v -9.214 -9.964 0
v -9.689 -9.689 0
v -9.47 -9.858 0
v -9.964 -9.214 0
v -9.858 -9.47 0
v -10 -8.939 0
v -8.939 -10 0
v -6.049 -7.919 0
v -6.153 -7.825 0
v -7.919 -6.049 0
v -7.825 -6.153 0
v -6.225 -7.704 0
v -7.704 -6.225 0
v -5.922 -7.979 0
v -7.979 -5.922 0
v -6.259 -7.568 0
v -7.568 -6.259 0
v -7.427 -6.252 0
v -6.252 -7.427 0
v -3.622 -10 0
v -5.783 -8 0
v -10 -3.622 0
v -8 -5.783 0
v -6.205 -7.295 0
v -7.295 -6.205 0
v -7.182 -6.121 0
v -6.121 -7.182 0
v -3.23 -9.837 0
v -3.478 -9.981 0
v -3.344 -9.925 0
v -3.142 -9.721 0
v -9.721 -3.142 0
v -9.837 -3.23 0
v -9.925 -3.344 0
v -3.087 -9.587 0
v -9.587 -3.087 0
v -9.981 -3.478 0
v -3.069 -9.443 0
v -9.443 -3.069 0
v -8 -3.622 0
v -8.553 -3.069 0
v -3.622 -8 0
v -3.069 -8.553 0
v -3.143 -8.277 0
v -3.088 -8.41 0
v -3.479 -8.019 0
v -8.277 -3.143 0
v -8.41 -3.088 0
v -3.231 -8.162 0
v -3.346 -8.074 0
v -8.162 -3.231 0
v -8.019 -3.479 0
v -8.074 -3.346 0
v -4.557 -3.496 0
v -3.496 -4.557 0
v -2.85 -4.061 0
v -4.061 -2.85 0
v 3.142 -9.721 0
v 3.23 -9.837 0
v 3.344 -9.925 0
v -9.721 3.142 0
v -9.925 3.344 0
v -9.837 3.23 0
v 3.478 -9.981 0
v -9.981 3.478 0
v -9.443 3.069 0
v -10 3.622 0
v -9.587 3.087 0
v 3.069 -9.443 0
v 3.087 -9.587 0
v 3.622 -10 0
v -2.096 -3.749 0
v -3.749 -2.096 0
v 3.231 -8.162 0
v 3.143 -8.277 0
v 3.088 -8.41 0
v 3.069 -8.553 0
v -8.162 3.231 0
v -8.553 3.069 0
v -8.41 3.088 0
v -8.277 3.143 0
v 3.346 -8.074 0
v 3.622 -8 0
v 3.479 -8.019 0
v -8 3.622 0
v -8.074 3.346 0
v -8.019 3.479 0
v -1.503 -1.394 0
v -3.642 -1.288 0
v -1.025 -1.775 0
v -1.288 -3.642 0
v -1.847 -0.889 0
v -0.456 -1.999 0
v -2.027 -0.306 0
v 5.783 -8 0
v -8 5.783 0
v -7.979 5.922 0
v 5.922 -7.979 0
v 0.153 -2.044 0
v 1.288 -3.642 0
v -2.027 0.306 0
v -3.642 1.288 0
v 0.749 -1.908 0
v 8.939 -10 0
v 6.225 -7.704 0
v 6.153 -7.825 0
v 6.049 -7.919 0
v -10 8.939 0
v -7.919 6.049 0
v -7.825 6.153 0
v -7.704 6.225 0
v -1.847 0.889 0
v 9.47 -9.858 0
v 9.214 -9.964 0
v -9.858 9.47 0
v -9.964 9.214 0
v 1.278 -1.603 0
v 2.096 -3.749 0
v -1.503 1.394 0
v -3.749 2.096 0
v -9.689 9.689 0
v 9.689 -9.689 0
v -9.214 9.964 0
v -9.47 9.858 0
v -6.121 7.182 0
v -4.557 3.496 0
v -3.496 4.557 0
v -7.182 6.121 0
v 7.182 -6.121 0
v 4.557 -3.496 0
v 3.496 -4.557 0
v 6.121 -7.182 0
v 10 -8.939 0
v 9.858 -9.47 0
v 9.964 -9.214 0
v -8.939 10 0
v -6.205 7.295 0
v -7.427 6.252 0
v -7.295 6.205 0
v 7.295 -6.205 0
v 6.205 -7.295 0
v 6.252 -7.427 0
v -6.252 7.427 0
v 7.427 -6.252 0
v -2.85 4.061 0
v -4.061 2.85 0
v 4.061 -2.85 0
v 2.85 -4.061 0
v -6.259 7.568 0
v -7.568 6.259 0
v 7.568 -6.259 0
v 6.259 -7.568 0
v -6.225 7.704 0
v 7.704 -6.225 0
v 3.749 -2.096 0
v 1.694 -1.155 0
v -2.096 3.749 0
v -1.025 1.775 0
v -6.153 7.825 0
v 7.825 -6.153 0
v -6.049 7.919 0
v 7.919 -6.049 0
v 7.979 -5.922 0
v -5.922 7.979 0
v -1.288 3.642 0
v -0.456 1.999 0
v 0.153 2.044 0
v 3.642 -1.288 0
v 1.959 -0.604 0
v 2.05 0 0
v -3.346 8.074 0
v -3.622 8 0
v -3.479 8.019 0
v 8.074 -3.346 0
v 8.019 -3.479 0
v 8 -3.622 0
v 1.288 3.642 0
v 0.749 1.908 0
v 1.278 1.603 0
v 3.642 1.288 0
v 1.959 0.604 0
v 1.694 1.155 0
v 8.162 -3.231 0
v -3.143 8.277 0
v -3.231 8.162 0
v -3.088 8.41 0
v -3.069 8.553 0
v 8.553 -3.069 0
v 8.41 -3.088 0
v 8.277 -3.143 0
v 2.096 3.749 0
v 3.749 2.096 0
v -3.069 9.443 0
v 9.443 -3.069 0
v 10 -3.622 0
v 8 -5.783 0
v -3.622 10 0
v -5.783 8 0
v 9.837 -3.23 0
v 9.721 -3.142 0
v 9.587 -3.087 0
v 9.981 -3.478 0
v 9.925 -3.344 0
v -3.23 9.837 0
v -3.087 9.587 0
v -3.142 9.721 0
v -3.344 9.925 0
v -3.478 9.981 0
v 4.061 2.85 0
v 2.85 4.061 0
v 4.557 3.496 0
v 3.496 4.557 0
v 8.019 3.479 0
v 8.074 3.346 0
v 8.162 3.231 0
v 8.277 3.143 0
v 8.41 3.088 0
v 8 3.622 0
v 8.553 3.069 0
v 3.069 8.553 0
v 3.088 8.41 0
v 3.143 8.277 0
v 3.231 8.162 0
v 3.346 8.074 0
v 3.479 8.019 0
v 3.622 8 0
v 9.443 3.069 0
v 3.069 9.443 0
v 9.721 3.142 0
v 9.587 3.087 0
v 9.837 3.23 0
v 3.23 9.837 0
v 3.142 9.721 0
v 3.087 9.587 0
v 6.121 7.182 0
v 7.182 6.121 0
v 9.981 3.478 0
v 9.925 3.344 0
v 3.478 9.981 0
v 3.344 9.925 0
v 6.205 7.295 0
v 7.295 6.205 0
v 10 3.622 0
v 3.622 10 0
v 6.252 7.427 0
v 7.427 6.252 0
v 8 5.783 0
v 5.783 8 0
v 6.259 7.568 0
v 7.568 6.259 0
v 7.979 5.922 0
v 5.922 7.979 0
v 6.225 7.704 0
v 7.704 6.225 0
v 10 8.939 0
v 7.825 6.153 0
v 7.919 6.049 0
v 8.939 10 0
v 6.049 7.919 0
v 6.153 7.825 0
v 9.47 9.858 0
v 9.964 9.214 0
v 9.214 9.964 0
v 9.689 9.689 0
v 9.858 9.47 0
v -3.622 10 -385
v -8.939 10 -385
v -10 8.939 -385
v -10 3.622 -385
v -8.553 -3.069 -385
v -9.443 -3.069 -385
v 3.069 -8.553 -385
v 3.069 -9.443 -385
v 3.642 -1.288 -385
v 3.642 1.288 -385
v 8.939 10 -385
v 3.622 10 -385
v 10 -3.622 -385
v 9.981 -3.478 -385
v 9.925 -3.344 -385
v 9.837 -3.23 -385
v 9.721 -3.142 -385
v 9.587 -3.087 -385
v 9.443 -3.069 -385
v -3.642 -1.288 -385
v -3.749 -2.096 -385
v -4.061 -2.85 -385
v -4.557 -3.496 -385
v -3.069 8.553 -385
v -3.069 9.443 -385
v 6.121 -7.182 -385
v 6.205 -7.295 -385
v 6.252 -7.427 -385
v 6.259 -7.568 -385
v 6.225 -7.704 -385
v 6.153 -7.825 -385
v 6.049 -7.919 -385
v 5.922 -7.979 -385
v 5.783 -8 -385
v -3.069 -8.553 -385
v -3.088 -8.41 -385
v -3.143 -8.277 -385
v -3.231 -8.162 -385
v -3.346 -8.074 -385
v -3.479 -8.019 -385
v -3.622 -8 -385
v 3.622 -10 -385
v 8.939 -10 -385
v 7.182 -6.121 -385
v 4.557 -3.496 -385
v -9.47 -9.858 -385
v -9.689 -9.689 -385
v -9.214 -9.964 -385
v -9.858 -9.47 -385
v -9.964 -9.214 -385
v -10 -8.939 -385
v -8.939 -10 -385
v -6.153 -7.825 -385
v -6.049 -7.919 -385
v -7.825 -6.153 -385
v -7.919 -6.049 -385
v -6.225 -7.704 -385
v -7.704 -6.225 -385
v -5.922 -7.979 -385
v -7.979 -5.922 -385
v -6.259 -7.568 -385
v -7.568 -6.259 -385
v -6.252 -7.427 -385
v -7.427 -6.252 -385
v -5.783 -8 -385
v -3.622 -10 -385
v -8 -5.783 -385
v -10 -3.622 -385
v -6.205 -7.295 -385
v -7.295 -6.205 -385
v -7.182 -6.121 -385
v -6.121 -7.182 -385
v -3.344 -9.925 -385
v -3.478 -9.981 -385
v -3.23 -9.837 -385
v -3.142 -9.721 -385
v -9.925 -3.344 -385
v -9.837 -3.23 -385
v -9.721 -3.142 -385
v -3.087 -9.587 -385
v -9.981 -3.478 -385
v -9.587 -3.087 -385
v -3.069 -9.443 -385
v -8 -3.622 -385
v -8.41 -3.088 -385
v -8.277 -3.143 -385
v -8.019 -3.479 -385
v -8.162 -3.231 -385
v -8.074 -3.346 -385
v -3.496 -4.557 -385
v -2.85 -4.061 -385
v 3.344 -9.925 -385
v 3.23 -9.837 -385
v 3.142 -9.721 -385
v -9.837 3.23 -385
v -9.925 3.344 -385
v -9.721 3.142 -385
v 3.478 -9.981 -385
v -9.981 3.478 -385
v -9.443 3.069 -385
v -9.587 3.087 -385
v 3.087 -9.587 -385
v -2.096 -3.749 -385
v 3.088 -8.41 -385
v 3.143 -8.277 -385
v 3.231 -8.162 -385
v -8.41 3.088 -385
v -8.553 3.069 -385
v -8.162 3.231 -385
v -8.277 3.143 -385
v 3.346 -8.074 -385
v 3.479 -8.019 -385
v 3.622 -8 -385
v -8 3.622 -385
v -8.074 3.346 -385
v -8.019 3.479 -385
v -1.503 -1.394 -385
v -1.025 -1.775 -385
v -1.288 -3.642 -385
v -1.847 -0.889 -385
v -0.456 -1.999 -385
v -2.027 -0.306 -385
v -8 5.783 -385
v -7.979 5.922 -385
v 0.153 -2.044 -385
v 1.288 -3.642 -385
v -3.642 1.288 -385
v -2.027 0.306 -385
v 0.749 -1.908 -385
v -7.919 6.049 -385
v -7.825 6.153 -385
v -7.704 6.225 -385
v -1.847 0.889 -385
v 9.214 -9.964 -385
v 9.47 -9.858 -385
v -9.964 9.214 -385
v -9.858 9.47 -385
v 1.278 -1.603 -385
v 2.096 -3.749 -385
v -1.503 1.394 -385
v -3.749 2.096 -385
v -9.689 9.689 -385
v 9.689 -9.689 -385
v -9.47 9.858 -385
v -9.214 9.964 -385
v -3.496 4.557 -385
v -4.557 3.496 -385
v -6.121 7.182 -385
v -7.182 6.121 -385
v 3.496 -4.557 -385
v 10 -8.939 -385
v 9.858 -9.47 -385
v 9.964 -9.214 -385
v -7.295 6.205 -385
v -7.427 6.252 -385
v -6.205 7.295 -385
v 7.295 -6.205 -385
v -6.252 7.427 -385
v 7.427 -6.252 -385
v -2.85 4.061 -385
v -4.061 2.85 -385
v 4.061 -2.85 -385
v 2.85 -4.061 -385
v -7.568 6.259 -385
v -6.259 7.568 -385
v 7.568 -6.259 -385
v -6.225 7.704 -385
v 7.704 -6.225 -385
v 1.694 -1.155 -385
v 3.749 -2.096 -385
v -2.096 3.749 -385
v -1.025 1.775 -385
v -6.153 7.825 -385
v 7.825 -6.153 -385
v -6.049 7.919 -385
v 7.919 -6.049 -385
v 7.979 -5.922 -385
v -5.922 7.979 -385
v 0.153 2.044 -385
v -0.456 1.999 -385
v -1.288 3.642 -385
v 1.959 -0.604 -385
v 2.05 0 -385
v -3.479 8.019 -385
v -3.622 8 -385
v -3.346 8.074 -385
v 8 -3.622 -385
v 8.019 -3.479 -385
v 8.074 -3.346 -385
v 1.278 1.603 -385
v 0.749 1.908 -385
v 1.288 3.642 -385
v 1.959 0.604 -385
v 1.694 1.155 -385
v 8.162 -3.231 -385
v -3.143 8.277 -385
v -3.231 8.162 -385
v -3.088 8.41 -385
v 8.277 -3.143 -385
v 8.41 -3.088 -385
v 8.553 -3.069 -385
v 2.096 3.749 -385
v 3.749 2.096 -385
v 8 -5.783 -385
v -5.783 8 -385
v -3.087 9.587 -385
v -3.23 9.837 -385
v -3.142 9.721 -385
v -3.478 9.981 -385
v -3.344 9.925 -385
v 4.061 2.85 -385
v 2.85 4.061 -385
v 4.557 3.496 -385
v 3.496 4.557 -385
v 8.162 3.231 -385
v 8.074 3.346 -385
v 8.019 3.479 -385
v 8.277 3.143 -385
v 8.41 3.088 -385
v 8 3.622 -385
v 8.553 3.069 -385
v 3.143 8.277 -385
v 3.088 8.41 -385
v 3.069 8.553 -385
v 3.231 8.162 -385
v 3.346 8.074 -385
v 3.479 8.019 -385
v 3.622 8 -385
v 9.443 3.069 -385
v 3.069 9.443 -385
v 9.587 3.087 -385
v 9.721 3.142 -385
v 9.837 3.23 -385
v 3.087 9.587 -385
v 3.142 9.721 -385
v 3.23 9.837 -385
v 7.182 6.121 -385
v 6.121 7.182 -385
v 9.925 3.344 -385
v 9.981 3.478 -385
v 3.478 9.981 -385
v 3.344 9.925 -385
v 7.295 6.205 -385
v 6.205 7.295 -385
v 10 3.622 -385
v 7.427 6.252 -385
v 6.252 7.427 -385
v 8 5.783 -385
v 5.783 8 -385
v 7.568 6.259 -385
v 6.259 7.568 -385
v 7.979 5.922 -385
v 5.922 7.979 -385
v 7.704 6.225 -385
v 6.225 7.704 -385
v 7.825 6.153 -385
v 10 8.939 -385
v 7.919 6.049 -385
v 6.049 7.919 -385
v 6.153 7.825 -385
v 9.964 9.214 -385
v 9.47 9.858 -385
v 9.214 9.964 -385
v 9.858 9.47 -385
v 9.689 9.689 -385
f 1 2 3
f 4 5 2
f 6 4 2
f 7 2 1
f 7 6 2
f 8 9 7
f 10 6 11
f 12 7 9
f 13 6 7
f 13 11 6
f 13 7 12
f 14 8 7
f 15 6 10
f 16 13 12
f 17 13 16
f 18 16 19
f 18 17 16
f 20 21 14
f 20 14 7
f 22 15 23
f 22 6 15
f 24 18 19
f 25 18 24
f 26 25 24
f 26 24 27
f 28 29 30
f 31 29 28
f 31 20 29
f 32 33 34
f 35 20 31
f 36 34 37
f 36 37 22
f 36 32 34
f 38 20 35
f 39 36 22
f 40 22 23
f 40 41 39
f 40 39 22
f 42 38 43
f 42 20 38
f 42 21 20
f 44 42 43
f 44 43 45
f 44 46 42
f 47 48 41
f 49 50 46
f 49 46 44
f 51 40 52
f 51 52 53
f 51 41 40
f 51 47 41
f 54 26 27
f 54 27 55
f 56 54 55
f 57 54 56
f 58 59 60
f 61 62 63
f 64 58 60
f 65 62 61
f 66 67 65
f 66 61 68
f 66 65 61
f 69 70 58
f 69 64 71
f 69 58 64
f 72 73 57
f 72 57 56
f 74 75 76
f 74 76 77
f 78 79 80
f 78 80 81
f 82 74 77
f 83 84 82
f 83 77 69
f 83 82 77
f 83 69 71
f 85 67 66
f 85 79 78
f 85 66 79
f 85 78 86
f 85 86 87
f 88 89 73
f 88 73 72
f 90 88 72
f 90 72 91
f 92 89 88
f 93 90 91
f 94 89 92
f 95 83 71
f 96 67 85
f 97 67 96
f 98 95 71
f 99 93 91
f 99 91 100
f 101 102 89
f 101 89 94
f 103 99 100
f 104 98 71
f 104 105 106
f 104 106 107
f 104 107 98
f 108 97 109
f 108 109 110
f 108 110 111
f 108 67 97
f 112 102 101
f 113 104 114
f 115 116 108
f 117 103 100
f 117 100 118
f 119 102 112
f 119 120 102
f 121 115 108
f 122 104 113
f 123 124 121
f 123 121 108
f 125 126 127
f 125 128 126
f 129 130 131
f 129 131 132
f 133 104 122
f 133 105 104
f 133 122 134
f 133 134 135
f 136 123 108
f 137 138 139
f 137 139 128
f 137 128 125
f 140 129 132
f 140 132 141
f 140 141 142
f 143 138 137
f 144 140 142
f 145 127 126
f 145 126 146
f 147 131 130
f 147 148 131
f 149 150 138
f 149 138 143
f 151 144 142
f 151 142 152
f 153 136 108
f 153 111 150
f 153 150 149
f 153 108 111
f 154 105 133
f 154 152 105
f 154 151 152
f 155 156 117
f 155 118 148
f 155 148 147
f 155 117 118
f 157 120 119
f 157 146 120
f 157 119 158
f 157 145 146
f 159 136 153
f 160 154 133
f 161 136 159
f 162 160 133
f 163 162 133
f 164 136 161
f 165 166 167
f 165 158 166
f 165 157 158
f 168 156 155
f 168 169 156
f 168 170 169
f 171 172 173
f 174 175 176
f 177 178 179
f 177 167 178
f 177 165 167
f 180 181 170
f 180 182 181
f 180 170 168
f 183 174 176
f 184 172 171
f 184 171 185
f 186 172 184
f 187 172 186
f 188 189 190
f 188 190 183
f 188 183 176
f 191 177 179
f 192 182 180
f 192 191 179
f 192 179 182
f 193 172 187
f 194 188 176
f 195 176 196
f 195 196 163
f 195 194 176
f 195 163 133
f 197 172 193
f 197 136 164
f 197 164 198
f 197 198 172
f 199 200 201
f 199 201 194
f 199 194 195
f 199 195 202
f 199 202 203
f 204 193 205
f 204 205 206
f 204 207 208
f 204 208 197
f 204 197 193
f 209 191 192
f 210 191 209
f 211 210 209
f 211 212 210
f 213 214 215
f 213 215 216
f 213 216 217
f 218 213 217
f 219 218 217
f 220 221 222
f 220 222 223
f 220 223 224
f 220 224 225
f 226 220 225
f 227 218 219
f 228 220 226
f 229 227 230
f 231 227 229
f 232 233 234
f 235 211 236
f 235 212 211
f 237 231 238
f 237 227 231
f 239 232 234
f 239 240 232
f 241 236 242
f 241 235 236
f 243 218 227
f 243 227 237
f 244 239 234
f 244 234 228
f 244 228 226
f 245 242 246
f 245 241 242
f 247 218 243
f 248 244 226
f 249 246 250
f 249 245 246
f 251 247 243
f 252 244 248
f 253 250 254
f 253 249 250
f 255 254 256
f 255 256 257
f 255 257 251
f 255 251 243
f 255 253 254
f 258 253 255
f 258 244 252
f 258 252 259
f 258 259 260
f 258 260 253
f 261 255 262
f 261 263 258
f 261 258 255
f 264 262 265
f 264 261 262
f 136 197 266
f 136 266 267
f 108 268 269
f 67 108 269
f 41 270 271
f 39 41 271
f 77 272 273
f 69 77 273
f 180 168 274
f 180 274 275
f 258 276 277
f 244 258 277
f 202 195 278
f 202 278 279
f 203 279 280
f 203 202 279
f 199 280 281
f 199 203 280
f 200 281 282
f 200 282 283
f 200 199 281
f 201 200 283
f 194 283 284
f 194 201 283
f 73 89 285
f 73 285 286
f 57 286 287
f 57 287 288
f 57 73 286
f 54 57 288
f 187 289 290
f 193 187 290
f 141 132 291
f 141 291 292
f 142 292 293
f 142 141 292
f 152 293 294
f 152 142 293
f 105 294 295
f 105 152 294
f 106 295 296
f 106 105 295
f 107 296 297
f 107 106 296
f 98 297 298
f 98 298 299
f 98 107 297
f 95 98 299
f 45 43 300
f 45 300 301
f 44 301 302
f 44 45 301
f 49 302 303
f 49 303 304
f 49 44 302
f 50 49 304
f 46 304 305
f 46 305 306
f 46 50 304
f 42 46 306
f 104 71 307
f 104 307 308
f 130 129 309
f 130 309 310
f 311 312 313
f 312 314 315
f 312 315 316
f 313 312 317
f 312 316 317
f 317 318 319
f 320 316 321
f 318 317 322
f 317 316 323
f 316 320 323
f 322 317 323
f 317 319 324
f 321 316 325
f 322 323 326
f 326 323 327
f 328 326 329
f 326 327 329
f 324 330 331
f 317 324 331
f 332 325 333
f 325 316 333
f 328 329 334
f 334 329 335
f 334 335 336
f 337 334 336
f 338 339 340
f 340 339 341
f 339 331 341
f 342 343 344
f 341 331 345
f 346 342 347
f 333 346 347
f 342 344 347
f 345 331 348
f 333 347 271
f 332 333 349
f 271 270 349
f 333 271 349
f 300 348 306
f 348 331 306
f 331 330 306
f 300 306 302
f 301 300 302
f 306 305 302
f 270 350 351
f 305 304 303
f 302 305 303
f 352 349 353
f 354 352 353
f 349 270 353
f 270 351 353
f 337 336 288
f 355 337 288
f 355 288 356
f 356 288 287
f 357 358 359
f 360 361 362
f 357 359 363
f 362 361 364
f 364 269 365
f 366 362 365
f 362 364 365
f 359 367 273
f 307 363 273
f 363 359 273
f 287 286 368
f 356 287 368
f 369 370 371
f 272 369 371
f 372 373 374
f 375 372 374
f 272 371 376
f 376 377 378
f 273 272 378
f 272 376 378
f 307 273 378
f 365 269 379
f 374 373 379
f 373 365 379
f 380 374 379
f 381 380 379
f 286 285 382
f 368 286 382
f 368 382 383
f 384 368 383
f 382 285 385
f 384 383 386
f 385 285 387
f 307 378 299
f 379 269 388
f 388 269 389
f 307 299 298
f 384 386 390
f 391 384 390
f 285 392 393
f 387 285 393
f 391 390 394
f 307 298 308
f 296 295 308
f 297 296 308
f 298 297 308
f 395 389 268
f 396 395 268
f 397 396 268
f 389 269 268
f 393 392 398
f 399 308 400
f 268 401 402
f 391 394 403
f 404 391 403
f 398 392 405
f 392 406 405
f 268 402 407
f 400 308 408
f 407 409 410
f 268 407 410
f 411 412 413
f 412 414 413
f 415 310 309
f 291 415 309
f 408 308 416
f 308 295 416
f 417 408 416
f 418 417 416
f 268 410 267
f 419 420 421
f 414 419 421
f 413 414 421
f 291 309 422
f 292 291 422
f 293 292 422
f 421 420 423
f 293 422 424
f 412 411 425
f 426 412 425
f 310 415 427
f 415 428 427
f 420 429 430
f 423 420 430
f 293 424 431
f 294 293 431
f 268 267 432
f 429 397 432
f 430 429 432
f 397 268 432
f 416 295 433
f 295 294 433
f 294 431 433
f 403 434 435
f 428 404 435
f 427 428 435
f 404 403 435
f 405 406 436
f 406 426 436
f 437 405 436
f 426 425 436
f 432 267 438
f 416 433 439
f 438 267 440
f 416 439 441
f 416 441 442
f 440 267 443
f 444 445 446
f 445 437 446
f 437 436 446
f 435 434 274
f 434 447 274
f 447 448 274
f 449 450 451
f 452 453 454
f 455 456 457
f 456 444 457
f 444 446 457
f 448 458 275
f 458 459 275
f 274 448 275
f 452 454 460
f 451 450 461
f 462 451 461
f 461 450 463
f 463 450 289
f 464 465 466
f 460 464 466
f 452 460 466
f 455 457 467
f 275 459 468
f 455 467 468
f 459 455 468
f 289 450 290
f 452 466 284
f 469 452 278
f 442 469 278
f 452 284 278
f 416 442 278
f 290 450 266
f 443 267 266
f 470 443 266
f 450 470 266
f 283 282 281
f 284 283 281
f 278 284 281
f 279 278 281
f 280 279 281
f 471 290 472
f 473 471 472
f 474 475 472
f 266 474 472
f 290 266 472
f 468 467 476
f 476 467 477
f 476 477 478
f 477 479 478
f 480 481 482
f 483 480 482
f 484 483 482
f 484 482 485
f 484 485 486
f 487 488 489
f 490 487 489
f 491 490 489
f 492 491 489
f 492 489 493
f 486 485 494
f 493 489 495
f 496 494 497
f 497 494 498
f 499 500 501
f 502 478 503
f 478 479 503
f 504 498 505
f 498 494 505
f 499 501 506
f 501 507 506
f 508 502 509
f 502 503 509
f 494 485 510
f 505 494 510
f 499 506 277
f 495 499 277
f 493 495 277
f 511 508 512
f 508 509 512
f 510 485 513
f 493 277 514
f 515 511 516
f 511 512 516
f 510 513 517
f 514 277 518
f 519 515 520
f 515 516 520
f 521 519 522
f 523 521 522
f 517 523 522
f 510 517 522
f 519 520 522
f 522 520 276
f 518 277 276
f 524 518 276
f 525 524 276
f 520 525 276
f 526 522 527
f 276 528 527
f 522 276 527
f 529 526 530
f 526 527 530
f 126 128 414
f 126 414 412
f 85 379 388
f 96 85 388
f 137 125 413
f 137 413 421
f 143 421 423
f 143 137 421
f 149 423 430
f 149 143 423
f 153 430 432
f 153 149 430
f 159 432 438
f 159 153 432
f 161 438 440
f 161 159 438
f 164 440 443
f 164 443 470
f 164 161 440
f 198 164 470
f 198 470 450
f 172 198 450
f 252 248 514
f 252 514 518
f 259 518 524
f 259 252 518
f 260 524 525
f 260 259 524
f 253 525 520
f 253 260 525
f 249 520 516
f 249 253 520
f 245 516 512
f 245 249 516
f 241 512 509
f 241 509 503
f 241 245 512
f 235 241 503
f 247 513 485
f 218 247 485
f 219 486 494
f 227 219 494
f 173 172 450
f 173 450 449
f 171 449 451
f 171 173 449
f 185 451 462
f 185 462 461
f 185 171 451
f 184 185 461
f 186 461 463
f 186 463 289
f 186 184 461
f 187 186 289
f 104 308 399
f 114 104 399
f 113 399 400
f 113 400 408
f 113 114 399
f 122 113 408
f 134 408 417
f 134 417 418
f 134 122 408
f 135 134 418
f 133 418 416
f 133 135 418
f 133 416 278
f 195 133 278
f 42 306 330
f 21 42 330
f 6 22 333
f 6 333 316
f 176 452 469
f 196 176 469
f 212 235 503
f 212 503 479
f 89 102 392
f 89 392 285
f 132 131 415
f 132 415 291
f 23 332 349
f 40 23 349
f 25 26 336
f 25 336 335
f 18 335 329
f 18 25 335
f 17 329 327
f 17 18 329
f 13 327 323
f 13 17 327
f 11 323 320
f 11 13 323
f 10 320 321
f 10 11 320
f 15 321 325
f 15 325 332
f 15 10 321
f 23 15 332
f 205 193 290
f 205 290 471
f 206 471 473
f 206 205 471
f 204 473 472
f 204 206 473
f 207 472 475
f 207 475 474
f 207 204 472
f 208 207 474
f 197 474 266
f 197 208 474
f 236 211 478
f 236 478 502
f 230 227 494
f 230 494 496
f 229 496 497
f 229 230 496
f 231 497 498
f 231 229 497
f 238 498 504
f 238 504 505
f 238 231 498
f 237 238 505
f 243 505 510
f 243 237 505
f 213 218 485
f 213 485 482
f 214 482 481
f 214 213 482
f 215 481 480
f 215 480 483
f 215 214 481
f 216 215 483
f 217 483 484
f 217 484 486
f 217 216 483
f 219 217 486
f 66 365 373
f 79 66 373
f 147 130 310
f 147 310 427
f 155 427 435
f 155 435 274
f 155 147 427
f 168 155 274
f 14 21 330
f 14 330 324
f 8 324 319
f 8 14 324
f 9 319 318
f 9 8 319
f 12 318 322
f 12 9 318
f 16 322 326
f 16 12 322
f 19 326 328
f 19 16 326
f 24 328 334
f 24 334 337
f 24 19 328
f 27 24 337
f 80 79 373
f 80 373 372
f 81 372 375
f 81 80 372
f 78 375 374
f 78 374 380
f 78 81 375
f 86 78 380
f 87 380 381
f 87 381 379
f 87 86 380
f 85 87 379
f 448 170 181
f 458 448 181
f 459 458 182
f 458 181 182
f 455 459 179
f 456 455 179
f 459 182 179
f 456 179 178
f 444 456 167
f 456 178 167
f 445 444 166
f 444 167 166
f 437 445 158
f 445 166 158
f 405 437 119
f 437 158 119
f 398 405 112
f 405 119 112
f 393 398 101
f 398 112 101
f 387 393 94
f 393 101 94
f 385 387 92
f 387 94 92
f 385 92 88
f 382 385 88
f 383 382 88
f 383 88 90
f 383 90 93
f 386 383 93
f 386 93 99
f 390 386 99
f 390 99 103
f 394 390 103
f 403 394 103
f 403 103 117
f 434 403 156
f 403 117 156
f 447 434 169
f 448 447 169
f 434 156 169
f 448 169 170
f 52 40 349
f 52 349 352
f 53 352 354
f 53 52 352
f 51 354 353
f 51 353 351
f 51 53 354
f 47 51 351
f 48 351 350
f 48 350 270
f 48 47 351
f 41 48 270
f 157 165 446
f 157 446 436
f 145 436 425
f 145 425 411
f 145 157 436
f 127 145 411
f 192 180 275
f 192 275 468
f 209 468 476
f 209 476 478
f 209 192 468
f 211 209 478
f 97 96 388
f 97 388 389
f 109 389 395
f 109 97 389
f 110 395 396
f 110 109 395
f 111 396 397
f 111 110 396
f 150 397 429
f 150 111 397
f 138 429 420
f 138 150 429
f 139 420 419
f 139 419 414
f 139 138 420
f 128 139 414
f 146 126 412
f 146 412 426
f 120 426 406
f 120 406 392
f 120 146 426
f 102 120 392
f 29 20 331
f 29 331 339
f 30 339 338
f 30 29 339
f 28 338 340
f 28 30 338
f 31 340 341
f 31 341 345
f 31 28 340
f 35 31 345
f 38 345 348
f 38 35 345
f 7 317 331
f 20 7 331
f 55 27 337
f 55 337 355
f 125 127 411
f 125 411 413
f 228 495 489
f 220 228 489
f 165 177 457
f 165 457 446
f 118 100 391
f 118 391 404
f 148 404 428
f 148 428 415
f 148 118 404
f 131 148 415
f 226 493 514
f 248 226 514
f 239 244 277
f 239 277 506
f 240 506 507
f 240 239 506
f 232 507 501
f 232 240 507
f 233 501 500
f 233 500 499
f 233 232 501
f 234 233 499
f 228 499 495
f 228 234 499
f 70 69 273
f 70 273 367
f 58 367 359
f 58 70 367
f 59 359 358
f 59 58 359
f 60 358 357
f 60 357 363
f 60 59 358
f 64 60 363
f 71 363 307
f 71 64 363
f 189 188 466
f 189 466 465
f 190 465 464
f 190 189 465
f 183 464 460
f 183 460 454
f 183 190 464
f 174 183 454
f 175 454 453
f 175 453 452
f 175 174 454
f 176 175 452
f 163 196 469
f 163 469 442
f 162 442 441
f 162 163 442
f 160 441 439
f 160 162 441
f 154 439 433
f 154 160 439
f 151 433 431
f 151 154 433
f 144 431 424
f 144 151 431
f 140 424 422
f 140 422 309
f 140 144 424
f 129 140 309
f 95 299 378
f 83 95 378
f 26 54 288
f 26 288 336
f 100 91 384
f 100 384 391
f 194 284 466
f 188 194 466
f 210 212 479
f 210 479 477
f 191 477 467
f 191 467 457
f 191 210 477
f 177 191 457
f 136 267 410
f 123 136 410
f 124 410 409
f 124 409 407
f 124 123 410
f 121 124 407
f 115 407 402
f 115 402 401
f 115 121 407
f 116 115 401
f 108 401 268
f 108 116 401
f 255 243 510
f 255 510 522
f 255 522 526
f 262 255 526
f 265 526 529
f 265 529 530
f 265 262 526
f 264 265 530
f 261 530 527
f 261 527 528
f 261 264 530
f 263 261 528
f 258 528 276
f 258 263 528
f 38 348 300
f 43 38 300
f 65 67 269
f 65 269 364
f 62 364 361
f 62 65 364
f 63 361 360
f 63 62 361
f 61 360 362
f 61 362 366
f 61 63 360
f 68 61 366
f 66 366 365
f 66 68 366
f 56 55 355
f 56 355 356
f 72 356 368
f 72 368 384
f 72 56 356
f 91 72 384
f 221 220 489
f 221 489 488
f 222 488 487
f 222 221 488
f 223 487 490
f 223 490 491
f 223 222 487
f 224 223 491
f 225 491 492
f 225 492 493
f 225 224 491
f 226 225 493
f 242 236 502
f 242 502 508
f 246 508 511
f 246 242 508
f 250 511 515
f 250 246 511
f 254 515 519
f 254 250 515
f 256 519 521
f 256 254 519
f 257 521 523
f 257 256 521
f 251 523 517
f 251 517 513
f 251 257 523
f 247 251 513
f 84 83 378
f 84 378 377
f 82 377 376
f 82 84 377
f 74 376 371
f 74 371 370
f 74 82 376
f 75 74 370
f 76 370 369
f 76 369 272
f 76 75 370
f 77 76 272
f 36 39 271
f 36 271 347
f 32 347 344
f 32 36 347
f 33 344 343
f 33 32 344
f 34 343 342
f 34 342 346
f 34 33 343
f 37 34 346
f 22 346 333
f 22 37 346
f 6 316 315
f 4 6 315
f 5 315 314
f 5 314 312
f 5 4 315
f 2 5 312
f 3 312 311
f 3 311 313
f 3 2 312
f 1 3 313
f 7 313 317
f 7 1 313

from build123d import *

# Parameters (mm, degrees)
SKETCH2_R           = 2.05
BOSS_EXTRUDE2_DEPTH = 385


with BuildPart() as part:
    # Sketch2 → Boss-Extrude2 (new body)
    with BuildSketch(Plane.XY):
        with BuildLine():
            Line((-3.642230561, 1.287773026), (-3.642230561, -1.287773026))
            ThreePointArc((-3.642230561, -1.287773026), (-3.87999308, -2.483085929), (-4.55708345, -3.496423279))
            Line((-4.55708345, -3.496423279), (-7.182004606, -6.121344434))
            ThreePointArc((-7.182004606, -6.121344434), (-7.704200045, -6.225215565), (-8, -5.782519648))
            Line((-8, -5.782519648), (-8, -3.622007668))
            ThreePointArc((-8, -3.622007668), (-8.161974206, -3.230967343), (-8.553014531, -3.068993137))
            Line((-8.553014531, -3.068993137), (-9.443284204, -3.068993137))
            ThreePointArc((-9.443284204, -3.068993137), (-9.836715763, -3.229656566), (-10, -3.622007668))
            Line((-10, -3.622007668), (-10, -8.939033256))
            ThreePointArc((-10, -8.939033256), (-9.689250035, -9.689250035), (-8.939033256, -10))
            Line((-8.939033256, -10), (-3.622007668, -10))
            ThreePointArc((-3.622007668, -10), (-3.229656566, -9.836715763), (-3.068993137, -9.443284204))
            Line((-3.068993137, -9.443284204), (-3.068993137, -8.553014531))
            ThreePointArc((-3.068993137, -8.553014531), (-3.230967343, -8.161974206), (-3.622007668, -8))
            Line((-3.622007668, -8), (-5.782519648, -8))
            ThreePointArc((-5.782519648, -8), (-6.225215565, -7.704200045), (-6.121344434, -7.182004606))
            Line((-6.121344434, -7.182004606), (-3.496423279, -4.55708345))
            ThreePointArc((-3.496423279, -4.55708345), (-2.483085929, -3.87999308), (-1.287773026, -3.642230561))
            Line((-1.287773026, -3.642230561), (1.287773026, -3.642230561))
            ThreePointArc((1.287773026, -3.642230561), (2.483085929, -3.87999308), (3.496423279, -4.55708345))
            Line((3.496423279, -4.55708345), (6.121344434, -7.182004606))
            ThreePointArc((6.121344434, -7.182004606), (6.225215565, -7.704200045), (5.782519648, -8))
            Line((5.782519648, -8), (3.622007668, -8))
            ThreePointArc((3.622007668, -8), (3.230967343, -8.161974206), (3.068993137, -8.553014531))
            Line((3.068993137, -8.553014531), (3.068993137, -9.443284204))
            ThreePointArc((3.068993137, -9.443284204), (3.229656566, -9.836715763), (3.622007668, -10))
            Line((3.622007668, -10), (8.939033256, -10))
            ThreePointArc((8.939033256, -10), (9.689250035, -9.689250035), (10, -8.939033256))
            Line((10, -8.939033256), (10, -3.622007668))
            ThreePointArc((10, -3.622007668), (9.836715763, -3.229656566), (9.443284204, -3.068993137))
            Line((9.443284204, -3.068993137), (8.553014531, -3.068993137))
            ThreePointArc((8.553014531, -3.068993137), (8.161974206, -3.230967343), (8, -3.622007668))
            Line((8, -3.622007668), (8, -5.782519648))
            ThreePointArc((8, -5.782519648), (7.704200045, -6.225215565), (7.182004606, -6.121344434))
            Line((7.182004606, -6.121344434), (4.55708345, -3.496423279))
            ThreePointArc((4.55708345, -3.496423279), (3.87999308, -2.483085929), (3.642230561, -1.287773026))
            Line((3.642230561, -1.287773026), (3.642230561, 1.287773026))
            ThreePointArc((3.642230561, 1.287773026), (3.87999308, 2.483085929), (4.55708345, 3.496423279))
            Line((4.55708345, 3.496423279), (7.182004606, 6.121344434))
            ThreePointArc((7.182004606, 6.121344434), (7.704200045, 6.225215565), (8, 5.782519648))
            Line((8, 5.782519648), (8, 3.622007668))
            ThreePointArc((8, 3.622007668), (8.161974206, 3.230967343), (8.553014531, 3.068993137))
            Line((8.553014531, 3.068993137), (9.443284204, 3.068993137))
            ThreePointArc((9.443284204, 3.068993137), (9.836715763, 3.229656566), (10, 3.622007668))
            Line((10, 3.622007668), (10, 8.939033256))
            ThreePointArc((10, 8.939033256), (9.689250035, 9.689250035), (8.939033256, 10))
            Line((8.939033256, 10), (3.622007668, 10))
            ThreePointArc((3.622007668, 10), (3.229656566, 9.836715763), (3.068993137, 9.443284204))
            Line((3.068993137, 9.443284204), (3.068993137, 8.553014531))
            ThreePointArc((3.068993137, 8.553014531), (3.230967343, 8.161974206), (3.622007668, 8))
            Line((3.622007668, 8), (5.782519648, 8))
            ThreePointArc((5.782519648, 8), (6.225215565, 7.704200045), (6.121344434, 7.182004606))
            Line((6.121344434, 7.182004606), (3.496423279, 4.55708345))
            ThreePointArc((3.496423279, 4.55708345), (2.483085929, 3.87999308), (1.287773026, 3.642230561))
            Line((1.287773026, 3.642230561), (-1.287773026, 3.642230561))
            ThreePointArc((-1.287773026, 3.642230561), (-2.483085929, 3.87999308), (-3.496423279, 4.55708345))
            Line((-3.496423279, 4.55708345), (-6.121344434, 7.182004606))
            ThreePointArc((-6.121344434, 7.182004606), (-6.225215565, 7.704200045), (-5.782519648, 8))
            Line((-5.782519648, 8), (-3.622007668, 8))
            ThreePointArc((-3.622007668, 8), (-3.230967343, 8.161974206), (-3.068993137, 8.553014531))
            Line((-3.068993137, 8.553014531), (-3.068993137, 9.443284204))
            ThreePointArc((-3.068993137, 9.443284204), (-3.229656566, 9.836715763), (-3.622007668, 10))
            Line((-3.622007668, 10), (-8.939033256, 10))
            ThreePointArc((-8.939033256, 10), (-9.689250035, 9.689250035), (-10, 8.939033256))
            Line((-10, 8.939033256), (-10, 3.622007668))
            ThreePointArc((-10, 3.622007668), (-9.836715763, 3.229656566), (-9.443284204, 3.068993137))
            Line((-9.443284204, 3.068993137), (-8.553014531, 3.068993137))
            ThreePointArc((-8.553014531, 3.068993137), (-8.161974206, 3.230967343), (-8, 3.622007668))
            Line((-8, 3.622007668), (-8, 5.782519648))
            ThreePointArc((-8, 5.782519648), (-7.704200045, 6.225215565), (-7.182004606, 6.121344434))
            Line((-7.182004606, 6.121344434), (-4.55708345, 3.496423279))
            ThreePointArc((-4.55708345, 3.496423279), (-3.87999308, 2.483085929), (-3.642230561, 1.287773026))
        make_face()
        Circle(SKETCH2_R, mode=Mode.SUBTRACT)
    extrude(amount=-BOSS_EXTRUDE2_DEPTH)


solid = part.part
